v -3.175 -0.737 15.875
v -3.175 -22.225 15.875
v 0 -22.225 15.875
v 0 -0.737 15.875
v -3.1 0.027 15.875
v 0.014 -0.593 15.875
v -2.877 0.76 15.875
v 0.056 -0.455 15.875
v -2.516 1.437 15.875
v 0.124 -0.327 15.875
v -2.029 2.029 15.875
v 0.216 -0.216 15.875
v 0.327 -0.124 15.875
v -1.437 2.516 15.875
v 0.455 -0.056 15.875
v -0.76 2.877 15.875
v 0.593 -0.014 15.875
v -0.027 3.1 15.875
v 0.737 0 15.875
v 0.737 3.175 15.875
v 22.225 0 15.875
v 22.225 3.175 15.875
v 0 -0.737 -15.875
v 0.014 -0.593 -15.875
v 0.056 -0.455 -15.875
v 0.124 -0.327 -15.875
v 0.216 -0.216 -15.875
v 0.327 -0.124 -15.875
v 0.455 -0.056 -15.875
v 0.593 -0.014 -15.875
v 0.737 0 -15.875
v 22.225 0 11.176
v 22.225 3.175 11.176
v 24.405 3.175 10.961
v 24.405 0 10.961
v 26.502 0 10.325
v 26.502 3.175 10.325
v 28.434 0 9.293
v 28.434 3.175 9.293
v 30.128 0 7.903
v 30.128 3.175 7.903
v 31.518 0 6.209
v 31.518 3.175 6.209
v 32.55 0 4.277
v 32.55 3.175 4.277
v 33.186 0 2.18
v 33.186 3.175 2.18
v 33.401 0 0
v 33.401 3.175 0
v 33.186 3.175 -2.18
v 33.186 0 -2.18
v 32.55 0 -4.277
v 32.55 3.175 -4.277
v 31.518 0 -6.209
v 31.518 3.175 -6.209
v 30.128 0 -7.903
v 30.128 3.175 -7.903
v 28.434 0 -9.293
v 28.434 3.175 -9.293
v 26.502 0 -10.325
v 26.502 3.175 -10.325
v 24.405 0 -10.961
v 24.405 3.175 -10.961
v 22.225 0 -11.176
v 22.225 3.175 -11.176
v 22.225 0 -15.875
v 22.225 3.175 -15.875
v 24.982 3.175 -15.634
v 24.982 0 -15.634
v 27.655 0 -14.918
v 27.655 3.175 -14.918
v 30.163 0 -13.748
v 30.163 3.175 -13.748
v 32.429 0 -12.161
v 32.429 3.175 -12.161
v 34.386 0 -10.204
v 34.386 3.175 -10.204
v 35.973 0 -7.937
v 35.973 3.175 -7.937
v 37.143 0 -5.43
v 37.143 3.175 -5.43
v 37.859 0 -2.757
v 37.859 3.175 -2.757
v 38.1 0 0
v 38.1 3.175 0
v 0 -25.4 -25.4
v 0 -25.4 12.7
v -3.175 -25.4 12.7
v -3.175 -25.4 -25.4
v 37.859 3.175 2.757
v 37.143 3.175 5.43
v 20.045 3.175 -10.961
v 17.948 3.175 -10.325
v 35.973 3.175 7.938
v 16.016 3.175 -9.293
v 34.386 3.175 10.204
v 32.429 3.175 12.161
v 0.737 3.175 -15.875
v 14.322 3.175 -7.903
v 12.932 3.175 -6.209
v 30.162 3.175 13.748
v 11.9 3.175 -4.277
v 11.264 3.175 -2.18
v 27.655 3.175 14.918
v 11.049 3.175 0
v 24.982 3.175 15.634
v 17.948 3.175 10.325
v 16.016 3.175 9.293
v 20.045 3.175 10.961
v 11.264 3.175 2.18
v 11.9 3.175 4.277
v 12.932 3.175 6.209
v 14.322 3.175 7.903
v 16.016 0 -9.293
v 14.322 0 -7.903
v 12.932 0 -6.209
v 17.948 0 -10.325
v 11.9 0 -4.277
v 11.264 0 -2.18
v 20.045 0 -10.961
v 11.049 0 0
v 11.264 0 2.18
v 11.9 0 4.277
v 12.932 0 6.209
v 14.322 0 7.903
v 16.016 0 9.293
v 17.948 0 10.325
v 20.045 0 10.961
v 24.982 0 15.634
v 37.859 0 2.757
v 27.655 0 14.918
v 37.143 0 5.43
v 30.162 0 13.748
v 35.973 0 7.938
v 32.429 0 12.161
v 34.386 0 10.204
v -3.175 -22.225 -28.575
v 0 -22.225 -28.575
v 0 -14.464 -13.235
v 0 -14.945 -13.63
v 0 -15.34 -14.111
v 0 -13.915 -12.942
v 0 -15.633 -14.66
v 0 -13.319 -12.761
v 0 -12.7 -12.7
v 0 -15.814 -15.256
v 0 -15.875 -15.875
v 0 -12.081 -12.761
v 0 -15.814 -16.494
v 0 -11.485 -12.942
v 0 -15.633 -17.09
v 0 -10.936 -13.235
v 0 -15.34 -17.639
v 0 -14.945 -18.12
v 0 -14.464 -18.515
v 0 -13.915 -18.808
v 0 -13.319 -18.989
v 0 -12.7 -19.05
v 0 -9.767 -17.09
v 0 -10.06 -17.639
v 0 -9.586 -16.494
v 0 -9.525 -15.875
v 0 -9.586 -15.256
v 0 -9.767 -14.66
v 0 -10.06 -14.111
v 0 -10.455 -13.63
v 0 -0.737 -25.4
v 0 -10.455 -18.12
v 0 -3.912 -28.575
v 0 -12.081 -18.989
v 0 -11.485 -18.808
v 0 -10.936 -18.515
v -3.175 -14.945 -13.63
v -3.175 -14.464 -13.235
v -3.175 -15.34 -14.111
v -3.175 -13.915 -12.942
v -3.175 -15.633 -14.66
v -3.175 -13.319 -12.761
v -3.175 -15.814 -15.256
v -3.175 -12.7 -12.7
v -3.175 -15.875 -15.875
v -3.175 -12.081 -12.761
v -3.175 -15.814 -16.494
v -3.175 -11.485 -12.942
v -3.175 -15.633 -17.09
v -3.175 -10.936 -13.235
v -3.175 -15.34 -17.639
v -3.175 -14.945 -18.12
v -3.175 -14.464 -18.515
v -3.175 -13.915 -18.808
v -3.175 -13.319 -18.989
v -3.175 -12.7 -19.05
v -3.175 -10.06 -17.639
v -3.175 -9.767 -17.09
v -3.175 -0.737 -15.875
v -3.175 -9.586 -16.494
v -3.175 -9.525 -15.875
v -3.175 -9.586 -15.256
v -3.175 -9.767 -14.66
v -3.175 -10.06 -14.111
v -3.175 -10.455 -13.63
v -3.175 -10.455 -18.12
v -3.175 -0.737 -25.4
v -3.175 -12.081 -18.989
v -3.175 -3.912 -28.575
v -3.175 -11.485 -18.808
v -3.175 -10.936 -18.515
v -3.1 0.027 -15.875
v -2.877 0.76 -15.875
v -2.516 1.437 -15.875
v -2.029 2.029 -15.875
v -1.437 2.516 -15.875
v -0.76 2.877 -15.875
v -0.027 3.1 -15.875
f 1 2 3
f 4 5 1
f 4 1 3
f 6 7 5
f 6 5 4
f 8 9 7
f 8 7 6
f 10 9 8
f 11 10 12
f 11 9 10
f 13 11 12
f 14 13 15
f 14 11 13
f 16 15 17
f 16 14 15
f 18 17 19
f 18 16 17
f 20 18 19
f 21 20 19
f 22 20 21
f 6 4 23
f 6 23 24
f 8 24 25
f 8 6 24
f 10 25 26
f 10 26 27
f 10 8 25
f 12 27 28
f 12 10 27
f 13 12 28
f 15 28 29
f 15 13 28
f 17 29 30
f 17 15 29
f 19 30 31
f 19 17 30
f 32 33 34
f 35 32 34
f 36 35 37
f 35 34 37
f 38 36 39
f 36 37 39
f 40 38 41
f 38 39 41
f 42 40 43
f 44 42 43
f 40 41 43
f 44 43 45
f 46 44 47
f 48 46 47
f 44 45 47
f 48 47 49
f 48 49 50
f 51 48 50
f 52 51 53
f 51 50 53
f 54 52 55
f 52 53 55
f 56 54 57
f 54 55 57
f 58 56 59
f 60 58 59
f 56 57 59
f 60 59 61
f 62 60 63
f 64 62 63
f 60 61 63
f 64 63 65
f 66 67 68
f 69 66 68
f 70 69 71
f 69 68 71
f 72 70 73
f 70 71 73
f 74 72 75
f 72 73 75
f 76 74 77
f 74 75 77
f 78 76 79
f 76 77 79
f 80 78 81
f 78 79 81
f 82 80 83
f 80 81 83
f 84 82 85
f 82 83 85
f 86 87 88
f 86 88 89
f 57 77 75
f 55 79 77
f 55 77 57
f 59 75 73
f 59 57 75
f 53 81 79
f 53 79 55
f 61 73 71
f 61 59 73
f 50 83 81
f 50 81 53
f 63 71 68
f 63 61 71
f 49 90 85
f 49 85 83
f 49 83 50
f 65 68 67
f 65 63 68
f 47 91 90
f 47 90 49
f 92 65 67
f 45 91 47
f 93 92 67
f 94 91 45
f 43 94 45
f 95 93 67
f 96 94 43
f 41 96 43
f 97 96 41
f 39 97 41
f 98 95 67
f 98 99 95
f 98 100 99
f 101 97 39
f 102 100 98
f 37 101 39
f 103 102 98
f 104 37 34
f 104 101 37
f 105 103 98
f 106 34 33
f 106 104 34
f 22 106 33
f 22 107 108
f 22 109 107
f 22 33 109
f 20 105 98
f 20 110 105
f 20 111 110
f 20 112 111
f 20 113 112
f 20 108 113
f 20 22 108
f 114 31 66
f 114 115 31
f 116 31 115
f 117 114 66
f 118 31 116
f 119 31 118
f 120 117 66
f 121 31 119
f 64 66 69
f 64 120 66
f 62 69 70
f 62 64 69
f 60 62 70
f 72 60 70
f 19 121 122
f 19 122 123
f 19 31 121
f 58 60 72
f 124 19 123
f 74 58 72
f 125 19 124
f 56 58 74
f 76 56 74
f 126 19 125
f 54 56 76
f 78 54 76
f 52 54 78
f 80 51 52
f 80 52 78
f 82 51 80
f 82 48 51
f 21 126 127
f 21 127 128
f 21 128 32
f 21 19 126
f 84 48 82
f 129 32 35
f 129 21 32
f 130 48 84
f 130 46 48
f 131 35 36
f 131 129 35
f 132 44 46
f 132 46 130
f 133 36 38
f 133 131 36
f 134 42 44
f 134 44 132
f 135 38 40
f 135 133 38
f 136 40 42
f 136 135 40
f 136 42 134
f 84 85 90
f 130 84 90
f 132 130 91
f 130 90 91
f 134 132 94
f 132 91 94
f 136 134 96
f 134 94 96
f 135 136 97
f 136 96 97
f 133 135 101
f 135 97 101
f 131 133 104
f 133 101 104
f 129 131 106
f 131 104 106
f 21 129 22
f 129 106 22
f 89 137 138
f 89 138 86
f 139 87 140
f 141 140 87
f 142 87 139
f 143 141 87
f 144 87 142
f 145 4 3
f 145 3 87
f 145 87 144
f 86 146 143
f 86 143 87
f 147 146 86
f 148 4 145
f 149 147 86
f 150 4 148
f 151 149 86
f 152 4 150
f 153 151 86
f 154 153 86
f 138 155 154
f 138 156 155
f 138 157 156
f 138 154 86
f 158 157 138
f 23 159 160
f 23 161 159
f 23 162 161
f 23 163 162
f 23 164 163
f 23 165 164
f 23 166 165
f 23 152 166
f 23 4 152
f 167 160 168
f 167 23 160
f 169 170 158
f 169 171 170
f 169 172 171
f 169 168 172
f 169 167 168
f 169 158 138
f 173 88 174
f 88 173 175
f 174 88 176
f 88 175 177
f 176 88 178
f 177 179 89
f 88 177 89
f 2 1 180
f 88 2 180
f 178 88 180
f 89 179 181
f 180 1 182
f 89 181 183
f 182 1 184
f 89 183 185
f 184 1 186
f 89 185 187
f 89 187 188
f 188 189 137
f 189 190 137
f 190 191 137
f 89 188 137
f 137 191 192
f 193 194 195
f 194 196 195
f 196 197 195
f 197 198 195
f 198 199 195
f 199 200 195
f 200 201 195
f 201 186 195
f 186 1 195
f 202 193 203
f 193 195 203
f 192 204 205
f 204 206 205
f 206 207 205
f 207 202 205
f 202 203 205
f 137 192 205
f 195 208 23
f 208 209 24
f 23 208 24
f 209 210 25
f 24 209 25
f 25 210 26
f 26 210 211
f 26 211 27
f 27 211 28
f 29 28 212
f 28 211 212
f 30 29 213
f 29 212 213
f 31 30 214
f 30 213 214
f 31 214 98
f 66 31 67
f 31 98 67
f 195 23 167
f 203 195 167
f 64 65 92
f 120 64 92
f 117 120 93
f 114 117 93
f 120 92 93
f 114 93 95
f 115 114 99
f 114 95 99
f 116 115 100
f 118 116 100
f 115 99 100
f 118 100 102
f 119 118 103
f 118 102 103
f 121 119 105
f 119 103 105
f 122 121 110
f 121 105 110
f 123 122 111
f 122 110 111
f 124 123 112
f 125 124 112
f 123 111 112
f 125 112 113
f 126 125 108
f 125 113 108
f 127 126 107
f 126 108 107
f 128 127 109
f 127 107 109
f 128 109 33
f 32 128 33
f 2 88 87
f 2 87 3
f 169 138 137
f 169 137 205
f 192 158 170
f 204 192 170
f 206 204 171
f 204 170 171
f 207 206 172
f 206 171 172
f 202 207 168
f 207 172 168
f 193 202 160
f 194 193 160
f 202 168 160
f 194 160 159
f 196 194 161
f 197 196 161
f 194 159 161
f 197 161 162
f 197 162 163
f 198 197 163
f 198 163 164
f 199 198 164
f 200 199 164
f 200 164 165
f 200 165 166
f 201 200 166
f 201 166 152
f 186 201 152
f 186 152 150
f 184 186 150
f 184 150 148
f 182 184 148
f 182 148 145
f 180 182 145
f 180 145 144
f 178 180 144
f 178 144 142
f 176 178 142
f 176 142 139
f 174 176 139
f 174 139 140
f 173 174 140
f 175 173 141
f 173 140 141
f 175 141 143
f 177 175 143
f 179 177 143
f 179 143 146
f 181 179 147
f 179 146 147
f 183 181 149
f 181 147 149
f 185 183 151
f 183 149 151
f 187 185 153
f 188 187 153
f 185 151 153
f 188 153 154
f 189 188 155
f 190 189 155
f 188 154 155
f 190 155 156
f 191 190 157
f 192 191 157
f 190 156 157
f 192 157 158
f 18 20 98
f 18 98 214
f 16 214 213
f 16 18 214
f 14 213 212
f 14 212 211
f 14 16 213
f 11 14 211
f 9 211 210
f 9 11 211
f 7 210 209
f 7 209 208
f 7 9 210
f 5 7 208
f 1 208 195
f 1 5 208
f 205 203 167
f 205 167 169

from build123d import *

# Parameters (mm, degrees)
BASE_FLANGE1_DEPTH  = 15.875
CUT_EXTRUDE1_DEPTH  = 51.201157855
SKETCH8_W           = 12.7
SKETCH8_H           = 24.6634
TAB1_DEPTH          = 3.175
SKETCH7_R           = 3.175
CUT_EXTRUDE2_DEPTH  = 54.975
BREAK_CORNER1_START = -3.175
BREAK_CORNER1_DEPTH = 3.175


# Read off the part's stored shape, not the designer's step: Break-Corner1
# Sheet-metal steps are written as plain solids
with BuildPart() as part:
    # Sketch1 → Base-Flange1 (new, symmetric)
    with BuildSketch(Plane.XY):
        with BuildLine():
            Line((0, -25.4), (0, -0.7366))
            ThreePointArc((0, -0.7366), (0.215745145, -0.215745145), (0.7366, 0))
            Line((0.7366, 0), (38.1, 0))
            Line((38.1, 0), (38.1, 3.175))
            Line((38.1, 3.175), (0.7366, 3.175))
            ThreePointArc((0.7366, 3.175), (-2.029318885, 2.029318885), (-3.175, -0.7366))
            Line((-3.175, -0.7366), (-3.175, -25.4))
            Line((-3.175, -25.4), (0, -25.4))
        make_face()
    extrude(amount=BASE_FLANGE1_DEPTH, both=True)

    # Sketch6 → Cut-Extrude1 (cut, through all)
    with BuildSketch(Plane(origin=(0, 3.175, 0), x_dir=(1, 0, 0), z_dir=(0, 1, 0))):
        with BuildLine():
            Line((38.1, -15.875), (38.1, -6.7e-08))
            ThreePointArc((38.1, -6.7e-08), (33.450320128, -11.225320175), (22.225, -15.875))
            Line((22.225, -15.875), (38.1, -15.875))
        make_face()
        with BuildLine():
            Line((38.1, 15.875), (22.225, 15.875))
            ThreePointArc((22.225, 15.875), (33.450320175, 11.225320128), (38.1, -6.7e-08))
            Line((38.1, -6.7e-08), (38.1, 15.875))
        make_face()
        with BuildLine():
            ThreePointArc((33.401, 0), (30.127625387, 7.902625387), (22.225, 11.176))
            Line((22.225, 11.176), (22.225, -11.176))
            ThreePointArc((22.225, -11.176), (30.127625387, -7.902625387), (33.401, 0))
        make_face()
        with BuildLine():
            Line((22.225, -11.176), (22.225, 11.176))
            ThreePointArc((22.225, 11.176), (11.049, 0), (22.225, -11.176))
        make_face()
    extrude(amount=-CUT_EXTRUDE1_DEPTH, mode=Mode.SUBTRACT)

    # Sketch8 → Tab1 (add)
    with BuildSketch(Plane(origin=(0, 0, 0), x_dir=(0, 0, -1), z_dir=(1, 0, 0))):
        with Locations((22.225, -13.0683)):
            Rectangle(SKETCH8_W, SKETCH8_H)
    extrude(amount=-TAB1_DEPTH)

    # Sketch7 → Cut-Extrude2 (cut, through all)
    with BuildSketch(Plane(origin=(0, 0, 0), x_dir=(0, 0, -1), z_dir=(1, 0, 0))):
        with Locations((15.875, -12.7)):
            Circle(SKETCH7_R)
    extrude(amount=-CUT_EXTRUDE2_DEPTH, mode=Mode.SUBTRACT)

    # Break-Corner1 outline → Break-Corner1 (cut)
    with BuildSketch(Plane.YZ.offset(BREAK_CORNER1_START)):
        Polygon((-25.4, -28.575), (-22.225, -28.575), (-25.4, -25.4), align=None)
        Polygon((-25.4, 15.875), (-25.4, 12.7), (-22.225, 15.875), align=None)
        Polygon((-0.7366, -25.4), (-3.9116, -28.575), (-0.7366, -28.575), align=None)
    extrude(amount=BREAK_CORNER1_DEPTH, mode=Mode.SUBTRACT)


solid = part.part
